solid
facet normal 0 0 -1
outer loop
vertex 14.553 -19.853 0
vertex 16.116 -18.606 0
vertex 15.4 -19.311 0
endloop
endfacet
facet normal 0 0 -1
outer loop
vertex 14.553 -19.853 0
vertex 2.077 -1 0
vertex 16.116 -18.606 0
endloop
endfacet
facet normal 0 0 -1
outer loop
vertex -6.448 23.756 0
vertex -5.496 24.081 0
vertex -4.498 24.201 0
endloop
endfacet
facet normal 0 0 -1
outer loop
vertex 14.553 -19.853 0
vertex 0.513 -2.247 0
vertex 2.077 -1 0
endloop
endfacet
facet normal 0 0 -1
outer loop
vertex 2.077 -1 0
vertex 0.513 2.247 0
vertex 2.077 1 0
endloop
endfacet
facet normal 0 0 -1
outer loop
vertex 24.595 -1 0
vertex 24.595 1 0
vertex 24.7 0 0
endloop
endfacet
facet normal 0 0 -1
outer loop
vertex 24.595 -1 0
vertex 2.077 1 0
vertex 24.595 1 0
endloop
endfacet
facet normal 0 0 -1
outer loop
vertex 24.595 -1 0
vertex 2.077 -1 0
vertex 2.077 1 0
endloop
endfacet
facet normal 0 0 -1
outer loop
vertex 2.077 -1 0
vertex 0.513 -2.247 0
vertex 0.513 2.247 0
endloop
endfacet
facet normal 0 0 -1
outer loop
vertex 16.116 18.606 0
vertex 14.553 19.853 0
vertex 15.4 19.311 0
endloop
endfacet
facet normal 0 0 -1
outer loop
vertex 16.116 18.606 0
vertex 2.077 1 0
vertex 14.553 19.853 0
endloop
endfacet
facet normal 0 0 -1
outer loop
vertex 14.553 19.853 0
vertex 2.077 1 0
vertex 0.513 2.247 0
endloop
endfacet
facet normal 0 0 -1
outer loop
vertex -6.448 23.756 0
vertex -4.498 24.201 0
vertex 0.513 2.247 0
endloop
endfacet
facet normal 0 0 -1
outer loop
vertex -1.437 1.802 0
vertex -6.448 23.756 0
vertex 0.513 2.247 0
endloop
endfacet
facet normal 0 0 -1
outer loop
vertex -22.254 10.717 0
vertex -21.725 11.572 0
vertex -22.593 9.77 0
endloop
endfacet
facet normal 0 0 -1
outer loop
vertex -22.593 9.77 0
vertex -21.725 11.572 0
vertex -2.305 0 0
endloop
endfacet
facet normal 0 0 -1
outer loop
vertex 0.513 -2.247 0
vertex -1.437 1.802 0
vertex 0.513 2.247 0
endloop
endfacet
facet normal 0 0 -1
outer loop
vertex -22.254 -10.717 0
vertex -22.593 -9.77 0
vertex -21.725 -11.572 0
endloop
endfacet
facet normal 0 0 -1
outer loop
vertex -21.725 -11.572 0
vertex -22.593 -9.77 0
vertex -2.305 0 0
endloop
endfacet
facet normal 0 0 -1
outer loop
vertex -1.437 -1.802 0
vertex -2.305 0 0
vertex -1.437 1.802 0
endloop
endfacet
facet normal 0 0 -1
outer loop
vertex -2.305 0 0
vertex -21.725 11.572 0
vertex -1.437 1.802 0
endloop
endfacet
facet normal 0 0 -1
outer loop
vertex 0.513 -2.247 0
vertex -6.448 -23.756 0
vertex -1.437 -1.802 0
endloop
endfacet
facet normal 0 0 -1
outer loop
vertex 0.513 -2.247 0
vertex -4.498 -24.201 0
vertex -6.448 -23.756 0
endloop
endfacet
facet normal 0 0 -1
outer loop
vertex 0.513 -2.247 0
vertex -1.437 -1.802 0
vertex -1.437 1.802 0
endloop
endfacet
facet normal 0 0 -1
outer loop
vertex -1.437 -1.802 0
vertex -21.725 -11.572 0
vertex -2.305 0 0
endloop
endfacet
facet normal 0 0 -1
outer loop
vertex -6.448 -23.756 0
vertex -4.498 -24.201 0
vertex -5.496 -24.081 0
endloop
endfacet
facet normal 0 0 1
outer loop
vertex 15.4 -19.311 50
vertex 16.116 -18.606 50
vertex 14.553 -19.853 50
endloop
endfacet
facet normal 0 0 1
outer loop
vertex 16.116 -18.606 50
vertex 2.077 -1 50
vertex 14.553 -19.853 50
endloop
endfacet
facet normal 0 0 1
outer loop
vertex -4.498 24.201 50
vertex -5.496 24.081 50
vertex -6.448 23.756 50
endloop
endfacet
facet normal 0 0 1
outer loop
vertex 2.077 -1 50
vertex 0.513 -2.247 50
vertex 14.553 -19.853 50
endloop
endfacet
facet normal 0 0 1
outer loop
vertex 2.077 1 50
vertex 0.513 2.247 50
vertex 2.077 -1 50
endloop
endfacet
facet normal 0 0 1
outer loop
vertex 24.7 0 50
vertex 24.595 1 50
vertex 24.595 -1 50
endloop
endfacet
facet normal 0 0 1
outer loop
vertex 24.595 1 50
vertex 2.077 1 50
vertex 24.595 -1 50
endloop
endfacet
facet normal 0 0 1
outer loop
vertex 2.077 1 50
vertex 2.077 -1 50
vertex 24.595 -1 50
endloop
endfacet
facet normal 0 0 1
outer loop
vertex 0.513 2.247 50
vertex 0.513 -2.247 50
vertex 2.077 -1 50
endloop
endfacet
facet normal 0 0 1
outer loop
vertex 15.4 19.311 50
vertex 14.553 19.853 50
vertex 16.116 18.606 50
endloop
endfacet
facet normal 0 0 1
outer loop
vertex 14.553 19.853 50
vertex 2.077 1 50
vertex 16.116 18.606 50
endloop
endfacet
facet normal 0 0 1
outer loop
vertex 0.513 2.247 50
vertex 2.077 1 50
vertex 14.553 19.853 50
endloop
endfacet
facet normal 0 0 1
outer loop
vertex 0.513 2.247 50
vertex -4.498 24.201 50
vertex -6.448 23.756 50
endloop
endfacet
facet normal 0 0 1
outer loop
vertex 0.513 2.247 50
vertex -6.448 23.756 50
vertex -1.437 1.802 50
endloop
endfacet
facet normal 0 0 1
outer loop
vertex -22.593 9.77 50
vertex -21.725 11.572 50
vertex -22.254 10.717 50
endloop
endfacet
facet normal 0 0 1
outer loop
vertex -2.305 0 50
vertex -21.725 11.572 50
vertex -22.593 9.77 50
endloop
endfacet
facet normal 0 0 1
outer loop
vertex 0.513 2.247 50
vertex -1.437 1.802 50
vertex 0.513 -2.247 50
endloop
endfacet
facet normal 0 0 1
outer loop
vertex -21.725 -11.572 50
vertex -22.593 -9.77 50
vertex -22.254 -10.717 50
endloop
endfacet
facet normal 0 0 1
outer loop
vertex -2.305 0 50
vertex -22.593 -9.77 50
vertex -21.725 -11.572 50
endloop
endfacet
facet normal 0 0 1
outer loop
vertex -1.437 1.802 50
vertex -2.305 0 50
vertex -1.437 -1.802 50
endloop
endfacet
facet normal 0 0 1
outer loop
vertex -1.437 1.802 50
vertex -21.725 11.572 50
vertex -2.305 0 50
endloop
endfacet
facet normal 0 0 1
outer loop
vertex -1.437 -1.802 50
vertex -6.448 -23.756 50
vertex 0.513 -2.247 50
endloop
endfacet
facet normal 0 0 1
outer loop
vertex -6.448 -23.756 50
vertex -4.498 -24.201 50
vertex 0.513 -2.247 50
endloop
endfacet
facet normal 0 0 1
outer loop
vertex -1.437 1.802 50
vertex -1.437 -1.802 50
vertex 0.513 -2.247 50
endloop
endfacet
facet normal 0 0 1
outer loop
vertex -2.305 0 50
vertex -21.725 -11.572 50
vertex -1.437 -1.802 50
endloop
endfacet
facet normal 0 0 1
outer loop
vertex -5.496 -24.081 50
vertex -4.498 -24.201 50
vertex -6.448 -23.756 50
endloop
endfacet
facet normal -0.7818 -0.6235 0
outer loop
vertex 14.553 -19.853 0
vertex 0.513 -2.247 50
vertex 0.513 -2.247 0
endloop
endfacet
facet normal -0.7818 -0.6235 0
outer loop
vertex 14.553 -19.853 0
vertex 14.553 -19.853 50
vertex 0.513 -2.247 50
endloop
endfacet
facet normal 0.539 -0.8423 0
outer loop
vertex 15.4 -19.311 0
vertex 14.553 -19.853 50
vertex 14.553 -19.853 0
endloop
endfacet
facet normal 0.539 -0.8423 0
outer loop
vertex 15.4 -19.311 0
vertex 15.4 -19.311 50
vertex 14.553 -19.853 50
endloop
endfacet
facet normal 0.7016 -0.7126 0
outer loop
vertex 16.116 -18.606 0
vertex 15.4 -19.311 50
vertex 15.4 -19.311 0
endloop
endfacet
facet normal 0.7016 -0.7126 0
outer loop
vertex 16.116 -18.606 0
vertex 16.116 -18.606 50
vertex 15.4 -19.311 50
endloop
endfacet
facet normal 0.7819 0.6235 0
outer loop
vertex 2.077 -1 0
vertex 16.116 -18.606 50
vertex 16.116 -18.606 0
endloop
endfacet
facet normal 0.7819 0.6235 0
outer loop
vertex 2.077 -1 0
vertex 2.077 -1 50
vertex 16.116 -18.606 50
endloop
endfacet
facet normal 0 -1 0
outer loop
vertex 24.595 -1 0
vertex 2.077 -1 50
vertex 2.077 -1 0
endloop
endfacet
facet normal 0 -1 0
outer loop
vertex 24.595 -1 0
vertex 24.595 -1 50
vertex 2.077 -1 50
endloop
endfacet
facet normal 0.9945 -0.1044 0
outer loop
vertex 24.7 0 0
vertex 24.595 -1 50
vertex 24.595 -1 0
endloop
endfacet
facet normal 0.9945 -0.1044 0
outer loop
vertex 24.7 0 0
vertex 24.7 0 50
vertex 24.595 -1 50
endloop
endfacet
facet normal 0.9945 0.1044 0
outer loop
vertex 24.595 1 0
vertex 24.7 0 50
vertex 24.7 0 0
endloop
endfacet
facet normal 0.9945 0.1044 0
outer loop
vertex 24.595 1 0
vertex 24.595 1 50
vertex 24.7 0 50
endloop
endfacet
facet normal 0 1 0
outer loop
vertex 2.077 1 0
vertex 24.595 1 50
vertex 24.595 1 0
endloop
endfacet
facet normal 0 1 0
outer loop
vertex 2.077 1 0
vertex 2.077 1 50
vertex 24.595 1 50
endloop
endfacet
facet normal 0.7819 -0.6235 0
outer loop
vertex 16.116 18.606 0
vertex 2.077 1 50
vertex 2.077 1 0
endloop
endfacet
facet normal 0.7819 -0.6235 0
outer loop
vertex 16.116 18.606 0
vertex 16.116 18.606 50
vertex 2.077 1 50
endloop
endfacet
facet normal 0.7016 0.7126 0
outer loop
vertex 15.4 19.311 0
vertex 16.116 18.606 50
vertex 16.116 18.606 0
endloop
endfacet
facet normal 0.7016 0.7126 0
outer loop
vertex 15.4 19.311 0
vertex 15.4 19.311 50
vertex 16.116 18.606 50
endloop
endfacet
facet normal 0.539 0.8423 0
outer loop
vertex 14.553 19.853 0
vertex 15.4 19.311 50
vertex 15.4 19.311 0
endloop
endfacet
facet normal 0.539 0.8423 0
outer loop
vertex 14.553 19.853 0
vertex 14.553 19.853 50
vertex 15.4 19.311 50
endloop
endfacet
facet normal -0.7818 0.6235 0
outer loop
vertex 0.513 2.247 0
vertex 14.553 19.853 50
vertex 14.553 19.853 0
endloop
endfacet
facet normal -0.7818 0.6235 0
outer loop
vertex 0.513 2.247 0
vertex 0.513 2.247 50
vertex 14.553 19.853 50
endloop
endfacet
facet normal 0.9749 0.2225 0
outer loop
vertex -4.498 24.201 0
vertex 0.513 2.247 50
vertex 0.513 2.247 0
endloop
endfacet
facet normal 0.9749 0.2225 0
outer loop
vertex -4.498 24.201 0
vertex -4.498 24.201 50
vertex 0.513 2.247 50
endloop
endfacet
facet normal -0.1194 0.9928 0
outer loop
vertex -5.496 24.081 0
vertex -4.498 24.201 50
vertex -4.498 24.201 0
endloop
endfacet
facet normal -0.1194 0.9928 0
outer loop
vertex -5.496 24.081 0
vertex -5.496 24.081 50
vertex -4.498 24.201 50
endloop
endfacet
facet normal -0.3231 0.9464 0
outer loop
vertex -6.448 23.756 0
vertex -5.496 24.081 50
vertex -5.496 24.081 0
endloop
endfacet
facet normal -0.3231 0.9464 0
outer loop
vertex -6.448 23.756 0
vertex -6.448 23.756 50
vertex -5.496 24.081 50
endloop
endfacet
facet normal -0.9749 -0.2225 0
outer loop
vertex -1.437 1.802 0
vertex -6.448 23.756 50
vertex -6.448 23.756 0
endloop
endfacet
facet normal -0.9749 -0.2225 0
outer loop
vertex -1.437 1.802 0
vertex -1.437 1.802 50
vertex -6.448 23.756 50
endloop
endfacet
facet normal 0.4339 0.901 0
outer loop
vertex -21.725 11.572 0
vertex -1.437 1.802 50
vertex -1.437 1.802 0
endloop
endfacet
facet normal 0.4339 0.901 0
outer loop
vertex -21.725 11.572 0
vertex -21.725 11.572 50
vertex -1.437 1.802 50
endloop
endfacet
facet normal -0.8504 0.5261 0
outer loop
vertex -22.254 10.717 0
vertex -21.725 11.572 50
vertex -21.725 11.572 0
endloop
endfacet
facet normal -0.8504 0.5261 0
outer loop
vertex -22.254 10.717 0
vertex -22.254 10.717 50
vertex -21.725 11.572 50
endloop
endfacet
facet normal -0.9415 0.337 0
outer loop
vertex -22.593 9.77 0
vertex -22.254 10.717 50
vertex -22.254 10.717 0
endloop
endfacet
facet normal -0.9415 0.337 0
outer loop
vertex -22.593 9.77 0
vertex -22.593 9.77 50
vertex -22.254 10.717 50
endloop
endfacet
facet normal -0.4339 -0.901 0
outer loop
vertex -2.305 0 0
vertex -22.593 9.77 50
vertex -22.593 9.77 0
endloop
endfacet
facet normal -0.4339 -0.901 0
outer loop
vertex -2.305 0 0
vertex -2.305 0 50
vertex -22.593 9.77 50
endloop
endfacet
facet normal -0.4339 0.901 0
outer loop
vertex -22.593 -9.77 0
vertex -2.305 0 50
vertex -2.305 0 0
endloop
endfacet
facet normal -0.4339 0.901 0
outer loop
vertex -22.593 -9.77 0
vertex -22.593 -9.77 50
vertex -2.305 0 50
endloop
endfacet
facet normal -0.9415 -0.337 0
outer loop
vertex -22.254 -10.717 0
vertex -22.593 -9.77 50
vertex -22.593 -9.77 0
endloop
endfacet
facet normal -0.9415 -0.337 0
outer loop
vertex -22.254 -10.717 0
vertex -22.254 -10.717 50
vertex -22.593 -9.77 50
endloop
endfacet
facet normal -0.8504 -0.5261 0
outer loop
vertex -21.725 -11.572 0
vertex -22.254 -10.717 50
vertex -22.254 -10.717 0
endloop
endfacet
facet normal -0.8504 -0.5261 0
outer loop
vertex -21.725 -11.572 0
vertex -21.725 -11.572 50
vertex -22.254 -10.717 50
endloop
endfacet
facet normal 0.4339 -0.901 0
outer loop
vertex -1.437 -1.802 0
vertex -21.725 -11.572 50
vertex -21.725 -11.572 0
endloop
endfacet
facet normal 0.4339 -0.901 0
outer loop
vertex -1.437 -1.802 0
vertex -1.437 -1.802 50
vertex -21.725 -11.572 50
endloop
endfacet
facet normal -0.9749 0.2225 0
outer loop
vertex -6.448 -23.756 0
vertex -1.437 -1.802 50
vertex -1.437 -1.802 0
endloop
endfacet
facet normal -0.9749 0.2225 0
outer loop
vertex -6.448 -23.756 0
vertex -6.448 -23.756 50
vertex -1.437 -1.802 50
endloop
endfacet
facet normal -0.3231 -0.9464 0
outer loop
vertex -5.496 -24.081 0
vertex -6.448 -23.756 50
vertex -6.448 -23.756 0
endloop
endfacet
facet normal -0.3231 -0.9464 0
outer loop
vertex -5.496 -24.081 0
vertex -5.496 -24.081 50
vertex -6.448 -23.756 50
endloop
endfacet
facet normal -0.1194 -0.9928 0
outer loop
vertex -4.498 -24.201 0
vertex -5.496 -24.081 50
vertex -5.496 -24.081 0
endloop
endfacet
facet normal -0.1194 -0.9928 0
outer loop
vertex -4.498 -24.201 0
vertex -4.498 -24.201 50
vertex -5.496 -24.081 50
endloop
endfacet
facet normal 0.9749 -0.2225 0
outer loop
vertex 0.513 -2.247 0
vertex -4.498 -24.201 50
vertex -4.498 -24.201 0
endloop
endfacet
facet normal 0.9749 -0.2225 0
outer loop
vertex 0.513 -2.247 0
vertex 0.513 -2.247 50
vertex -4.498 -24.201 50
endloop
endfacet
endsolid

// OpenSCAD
//Glass divider
//
//A divider thing to put inside a glass to divide it into segments
//
//Handy if you store things in drinking glasses
//
//Need to know:
// Glass inside diameter
// Clearance between thing and glass
// Number of seqments
// Wall thickness
// Height of thing
// Bottom chamfer required
// Bottom chamfer size
//
Diameter = 50;
Clearance = 0.3;
Segments = 7;
WallThickness = 2;
Height = 50;
ChamferOn = false;
ChamferSize = 10;
//
//Build one leg
module OneLeg()
{
    aDiameter = Diameter - (2 * Clearance);
    intersection()
    {
        circle(d=aDiameter);
        polygon(points = [[0, WallThickness/2], [0, -WallThickness/2], 
                    [Diameter, -WallThickness/2], [Diameter, WallThickness/2]]); 
    }
}
//
//Make a collection of legs
module AllLegs()
{
    for (aLeg=[1:1:Segments])
    {
        aAngle = (aLeg-1) * (360 / Segments);
        rotate (aAngle) OneLeg();
    }
}
//
//Make the chamfer shape
module Chamfer()
{
    //Make the chamfer cross section (yz plane) and rotate it (z axis)
    aRadius = Diameter/2;
    translate([0,0,Height])
    rotate([0,180,0])
    rotate_extrude($fn=360)
    polygon (points = [[aRadius-ChamferSize, -0.1], [aRadius, -0.1],
            [aRadius, ChamferSize]]);
}

//Extrude the legs
module Walls()
{
    linear_extrude(height = Height, center=false)
    AllLegs();
}
//
//Add the Chamfer if required
if (ChamferOn)
{
    difference()
    {
        Walls();
        Chamfer();
    }
}
else
{
    Walls();
}
